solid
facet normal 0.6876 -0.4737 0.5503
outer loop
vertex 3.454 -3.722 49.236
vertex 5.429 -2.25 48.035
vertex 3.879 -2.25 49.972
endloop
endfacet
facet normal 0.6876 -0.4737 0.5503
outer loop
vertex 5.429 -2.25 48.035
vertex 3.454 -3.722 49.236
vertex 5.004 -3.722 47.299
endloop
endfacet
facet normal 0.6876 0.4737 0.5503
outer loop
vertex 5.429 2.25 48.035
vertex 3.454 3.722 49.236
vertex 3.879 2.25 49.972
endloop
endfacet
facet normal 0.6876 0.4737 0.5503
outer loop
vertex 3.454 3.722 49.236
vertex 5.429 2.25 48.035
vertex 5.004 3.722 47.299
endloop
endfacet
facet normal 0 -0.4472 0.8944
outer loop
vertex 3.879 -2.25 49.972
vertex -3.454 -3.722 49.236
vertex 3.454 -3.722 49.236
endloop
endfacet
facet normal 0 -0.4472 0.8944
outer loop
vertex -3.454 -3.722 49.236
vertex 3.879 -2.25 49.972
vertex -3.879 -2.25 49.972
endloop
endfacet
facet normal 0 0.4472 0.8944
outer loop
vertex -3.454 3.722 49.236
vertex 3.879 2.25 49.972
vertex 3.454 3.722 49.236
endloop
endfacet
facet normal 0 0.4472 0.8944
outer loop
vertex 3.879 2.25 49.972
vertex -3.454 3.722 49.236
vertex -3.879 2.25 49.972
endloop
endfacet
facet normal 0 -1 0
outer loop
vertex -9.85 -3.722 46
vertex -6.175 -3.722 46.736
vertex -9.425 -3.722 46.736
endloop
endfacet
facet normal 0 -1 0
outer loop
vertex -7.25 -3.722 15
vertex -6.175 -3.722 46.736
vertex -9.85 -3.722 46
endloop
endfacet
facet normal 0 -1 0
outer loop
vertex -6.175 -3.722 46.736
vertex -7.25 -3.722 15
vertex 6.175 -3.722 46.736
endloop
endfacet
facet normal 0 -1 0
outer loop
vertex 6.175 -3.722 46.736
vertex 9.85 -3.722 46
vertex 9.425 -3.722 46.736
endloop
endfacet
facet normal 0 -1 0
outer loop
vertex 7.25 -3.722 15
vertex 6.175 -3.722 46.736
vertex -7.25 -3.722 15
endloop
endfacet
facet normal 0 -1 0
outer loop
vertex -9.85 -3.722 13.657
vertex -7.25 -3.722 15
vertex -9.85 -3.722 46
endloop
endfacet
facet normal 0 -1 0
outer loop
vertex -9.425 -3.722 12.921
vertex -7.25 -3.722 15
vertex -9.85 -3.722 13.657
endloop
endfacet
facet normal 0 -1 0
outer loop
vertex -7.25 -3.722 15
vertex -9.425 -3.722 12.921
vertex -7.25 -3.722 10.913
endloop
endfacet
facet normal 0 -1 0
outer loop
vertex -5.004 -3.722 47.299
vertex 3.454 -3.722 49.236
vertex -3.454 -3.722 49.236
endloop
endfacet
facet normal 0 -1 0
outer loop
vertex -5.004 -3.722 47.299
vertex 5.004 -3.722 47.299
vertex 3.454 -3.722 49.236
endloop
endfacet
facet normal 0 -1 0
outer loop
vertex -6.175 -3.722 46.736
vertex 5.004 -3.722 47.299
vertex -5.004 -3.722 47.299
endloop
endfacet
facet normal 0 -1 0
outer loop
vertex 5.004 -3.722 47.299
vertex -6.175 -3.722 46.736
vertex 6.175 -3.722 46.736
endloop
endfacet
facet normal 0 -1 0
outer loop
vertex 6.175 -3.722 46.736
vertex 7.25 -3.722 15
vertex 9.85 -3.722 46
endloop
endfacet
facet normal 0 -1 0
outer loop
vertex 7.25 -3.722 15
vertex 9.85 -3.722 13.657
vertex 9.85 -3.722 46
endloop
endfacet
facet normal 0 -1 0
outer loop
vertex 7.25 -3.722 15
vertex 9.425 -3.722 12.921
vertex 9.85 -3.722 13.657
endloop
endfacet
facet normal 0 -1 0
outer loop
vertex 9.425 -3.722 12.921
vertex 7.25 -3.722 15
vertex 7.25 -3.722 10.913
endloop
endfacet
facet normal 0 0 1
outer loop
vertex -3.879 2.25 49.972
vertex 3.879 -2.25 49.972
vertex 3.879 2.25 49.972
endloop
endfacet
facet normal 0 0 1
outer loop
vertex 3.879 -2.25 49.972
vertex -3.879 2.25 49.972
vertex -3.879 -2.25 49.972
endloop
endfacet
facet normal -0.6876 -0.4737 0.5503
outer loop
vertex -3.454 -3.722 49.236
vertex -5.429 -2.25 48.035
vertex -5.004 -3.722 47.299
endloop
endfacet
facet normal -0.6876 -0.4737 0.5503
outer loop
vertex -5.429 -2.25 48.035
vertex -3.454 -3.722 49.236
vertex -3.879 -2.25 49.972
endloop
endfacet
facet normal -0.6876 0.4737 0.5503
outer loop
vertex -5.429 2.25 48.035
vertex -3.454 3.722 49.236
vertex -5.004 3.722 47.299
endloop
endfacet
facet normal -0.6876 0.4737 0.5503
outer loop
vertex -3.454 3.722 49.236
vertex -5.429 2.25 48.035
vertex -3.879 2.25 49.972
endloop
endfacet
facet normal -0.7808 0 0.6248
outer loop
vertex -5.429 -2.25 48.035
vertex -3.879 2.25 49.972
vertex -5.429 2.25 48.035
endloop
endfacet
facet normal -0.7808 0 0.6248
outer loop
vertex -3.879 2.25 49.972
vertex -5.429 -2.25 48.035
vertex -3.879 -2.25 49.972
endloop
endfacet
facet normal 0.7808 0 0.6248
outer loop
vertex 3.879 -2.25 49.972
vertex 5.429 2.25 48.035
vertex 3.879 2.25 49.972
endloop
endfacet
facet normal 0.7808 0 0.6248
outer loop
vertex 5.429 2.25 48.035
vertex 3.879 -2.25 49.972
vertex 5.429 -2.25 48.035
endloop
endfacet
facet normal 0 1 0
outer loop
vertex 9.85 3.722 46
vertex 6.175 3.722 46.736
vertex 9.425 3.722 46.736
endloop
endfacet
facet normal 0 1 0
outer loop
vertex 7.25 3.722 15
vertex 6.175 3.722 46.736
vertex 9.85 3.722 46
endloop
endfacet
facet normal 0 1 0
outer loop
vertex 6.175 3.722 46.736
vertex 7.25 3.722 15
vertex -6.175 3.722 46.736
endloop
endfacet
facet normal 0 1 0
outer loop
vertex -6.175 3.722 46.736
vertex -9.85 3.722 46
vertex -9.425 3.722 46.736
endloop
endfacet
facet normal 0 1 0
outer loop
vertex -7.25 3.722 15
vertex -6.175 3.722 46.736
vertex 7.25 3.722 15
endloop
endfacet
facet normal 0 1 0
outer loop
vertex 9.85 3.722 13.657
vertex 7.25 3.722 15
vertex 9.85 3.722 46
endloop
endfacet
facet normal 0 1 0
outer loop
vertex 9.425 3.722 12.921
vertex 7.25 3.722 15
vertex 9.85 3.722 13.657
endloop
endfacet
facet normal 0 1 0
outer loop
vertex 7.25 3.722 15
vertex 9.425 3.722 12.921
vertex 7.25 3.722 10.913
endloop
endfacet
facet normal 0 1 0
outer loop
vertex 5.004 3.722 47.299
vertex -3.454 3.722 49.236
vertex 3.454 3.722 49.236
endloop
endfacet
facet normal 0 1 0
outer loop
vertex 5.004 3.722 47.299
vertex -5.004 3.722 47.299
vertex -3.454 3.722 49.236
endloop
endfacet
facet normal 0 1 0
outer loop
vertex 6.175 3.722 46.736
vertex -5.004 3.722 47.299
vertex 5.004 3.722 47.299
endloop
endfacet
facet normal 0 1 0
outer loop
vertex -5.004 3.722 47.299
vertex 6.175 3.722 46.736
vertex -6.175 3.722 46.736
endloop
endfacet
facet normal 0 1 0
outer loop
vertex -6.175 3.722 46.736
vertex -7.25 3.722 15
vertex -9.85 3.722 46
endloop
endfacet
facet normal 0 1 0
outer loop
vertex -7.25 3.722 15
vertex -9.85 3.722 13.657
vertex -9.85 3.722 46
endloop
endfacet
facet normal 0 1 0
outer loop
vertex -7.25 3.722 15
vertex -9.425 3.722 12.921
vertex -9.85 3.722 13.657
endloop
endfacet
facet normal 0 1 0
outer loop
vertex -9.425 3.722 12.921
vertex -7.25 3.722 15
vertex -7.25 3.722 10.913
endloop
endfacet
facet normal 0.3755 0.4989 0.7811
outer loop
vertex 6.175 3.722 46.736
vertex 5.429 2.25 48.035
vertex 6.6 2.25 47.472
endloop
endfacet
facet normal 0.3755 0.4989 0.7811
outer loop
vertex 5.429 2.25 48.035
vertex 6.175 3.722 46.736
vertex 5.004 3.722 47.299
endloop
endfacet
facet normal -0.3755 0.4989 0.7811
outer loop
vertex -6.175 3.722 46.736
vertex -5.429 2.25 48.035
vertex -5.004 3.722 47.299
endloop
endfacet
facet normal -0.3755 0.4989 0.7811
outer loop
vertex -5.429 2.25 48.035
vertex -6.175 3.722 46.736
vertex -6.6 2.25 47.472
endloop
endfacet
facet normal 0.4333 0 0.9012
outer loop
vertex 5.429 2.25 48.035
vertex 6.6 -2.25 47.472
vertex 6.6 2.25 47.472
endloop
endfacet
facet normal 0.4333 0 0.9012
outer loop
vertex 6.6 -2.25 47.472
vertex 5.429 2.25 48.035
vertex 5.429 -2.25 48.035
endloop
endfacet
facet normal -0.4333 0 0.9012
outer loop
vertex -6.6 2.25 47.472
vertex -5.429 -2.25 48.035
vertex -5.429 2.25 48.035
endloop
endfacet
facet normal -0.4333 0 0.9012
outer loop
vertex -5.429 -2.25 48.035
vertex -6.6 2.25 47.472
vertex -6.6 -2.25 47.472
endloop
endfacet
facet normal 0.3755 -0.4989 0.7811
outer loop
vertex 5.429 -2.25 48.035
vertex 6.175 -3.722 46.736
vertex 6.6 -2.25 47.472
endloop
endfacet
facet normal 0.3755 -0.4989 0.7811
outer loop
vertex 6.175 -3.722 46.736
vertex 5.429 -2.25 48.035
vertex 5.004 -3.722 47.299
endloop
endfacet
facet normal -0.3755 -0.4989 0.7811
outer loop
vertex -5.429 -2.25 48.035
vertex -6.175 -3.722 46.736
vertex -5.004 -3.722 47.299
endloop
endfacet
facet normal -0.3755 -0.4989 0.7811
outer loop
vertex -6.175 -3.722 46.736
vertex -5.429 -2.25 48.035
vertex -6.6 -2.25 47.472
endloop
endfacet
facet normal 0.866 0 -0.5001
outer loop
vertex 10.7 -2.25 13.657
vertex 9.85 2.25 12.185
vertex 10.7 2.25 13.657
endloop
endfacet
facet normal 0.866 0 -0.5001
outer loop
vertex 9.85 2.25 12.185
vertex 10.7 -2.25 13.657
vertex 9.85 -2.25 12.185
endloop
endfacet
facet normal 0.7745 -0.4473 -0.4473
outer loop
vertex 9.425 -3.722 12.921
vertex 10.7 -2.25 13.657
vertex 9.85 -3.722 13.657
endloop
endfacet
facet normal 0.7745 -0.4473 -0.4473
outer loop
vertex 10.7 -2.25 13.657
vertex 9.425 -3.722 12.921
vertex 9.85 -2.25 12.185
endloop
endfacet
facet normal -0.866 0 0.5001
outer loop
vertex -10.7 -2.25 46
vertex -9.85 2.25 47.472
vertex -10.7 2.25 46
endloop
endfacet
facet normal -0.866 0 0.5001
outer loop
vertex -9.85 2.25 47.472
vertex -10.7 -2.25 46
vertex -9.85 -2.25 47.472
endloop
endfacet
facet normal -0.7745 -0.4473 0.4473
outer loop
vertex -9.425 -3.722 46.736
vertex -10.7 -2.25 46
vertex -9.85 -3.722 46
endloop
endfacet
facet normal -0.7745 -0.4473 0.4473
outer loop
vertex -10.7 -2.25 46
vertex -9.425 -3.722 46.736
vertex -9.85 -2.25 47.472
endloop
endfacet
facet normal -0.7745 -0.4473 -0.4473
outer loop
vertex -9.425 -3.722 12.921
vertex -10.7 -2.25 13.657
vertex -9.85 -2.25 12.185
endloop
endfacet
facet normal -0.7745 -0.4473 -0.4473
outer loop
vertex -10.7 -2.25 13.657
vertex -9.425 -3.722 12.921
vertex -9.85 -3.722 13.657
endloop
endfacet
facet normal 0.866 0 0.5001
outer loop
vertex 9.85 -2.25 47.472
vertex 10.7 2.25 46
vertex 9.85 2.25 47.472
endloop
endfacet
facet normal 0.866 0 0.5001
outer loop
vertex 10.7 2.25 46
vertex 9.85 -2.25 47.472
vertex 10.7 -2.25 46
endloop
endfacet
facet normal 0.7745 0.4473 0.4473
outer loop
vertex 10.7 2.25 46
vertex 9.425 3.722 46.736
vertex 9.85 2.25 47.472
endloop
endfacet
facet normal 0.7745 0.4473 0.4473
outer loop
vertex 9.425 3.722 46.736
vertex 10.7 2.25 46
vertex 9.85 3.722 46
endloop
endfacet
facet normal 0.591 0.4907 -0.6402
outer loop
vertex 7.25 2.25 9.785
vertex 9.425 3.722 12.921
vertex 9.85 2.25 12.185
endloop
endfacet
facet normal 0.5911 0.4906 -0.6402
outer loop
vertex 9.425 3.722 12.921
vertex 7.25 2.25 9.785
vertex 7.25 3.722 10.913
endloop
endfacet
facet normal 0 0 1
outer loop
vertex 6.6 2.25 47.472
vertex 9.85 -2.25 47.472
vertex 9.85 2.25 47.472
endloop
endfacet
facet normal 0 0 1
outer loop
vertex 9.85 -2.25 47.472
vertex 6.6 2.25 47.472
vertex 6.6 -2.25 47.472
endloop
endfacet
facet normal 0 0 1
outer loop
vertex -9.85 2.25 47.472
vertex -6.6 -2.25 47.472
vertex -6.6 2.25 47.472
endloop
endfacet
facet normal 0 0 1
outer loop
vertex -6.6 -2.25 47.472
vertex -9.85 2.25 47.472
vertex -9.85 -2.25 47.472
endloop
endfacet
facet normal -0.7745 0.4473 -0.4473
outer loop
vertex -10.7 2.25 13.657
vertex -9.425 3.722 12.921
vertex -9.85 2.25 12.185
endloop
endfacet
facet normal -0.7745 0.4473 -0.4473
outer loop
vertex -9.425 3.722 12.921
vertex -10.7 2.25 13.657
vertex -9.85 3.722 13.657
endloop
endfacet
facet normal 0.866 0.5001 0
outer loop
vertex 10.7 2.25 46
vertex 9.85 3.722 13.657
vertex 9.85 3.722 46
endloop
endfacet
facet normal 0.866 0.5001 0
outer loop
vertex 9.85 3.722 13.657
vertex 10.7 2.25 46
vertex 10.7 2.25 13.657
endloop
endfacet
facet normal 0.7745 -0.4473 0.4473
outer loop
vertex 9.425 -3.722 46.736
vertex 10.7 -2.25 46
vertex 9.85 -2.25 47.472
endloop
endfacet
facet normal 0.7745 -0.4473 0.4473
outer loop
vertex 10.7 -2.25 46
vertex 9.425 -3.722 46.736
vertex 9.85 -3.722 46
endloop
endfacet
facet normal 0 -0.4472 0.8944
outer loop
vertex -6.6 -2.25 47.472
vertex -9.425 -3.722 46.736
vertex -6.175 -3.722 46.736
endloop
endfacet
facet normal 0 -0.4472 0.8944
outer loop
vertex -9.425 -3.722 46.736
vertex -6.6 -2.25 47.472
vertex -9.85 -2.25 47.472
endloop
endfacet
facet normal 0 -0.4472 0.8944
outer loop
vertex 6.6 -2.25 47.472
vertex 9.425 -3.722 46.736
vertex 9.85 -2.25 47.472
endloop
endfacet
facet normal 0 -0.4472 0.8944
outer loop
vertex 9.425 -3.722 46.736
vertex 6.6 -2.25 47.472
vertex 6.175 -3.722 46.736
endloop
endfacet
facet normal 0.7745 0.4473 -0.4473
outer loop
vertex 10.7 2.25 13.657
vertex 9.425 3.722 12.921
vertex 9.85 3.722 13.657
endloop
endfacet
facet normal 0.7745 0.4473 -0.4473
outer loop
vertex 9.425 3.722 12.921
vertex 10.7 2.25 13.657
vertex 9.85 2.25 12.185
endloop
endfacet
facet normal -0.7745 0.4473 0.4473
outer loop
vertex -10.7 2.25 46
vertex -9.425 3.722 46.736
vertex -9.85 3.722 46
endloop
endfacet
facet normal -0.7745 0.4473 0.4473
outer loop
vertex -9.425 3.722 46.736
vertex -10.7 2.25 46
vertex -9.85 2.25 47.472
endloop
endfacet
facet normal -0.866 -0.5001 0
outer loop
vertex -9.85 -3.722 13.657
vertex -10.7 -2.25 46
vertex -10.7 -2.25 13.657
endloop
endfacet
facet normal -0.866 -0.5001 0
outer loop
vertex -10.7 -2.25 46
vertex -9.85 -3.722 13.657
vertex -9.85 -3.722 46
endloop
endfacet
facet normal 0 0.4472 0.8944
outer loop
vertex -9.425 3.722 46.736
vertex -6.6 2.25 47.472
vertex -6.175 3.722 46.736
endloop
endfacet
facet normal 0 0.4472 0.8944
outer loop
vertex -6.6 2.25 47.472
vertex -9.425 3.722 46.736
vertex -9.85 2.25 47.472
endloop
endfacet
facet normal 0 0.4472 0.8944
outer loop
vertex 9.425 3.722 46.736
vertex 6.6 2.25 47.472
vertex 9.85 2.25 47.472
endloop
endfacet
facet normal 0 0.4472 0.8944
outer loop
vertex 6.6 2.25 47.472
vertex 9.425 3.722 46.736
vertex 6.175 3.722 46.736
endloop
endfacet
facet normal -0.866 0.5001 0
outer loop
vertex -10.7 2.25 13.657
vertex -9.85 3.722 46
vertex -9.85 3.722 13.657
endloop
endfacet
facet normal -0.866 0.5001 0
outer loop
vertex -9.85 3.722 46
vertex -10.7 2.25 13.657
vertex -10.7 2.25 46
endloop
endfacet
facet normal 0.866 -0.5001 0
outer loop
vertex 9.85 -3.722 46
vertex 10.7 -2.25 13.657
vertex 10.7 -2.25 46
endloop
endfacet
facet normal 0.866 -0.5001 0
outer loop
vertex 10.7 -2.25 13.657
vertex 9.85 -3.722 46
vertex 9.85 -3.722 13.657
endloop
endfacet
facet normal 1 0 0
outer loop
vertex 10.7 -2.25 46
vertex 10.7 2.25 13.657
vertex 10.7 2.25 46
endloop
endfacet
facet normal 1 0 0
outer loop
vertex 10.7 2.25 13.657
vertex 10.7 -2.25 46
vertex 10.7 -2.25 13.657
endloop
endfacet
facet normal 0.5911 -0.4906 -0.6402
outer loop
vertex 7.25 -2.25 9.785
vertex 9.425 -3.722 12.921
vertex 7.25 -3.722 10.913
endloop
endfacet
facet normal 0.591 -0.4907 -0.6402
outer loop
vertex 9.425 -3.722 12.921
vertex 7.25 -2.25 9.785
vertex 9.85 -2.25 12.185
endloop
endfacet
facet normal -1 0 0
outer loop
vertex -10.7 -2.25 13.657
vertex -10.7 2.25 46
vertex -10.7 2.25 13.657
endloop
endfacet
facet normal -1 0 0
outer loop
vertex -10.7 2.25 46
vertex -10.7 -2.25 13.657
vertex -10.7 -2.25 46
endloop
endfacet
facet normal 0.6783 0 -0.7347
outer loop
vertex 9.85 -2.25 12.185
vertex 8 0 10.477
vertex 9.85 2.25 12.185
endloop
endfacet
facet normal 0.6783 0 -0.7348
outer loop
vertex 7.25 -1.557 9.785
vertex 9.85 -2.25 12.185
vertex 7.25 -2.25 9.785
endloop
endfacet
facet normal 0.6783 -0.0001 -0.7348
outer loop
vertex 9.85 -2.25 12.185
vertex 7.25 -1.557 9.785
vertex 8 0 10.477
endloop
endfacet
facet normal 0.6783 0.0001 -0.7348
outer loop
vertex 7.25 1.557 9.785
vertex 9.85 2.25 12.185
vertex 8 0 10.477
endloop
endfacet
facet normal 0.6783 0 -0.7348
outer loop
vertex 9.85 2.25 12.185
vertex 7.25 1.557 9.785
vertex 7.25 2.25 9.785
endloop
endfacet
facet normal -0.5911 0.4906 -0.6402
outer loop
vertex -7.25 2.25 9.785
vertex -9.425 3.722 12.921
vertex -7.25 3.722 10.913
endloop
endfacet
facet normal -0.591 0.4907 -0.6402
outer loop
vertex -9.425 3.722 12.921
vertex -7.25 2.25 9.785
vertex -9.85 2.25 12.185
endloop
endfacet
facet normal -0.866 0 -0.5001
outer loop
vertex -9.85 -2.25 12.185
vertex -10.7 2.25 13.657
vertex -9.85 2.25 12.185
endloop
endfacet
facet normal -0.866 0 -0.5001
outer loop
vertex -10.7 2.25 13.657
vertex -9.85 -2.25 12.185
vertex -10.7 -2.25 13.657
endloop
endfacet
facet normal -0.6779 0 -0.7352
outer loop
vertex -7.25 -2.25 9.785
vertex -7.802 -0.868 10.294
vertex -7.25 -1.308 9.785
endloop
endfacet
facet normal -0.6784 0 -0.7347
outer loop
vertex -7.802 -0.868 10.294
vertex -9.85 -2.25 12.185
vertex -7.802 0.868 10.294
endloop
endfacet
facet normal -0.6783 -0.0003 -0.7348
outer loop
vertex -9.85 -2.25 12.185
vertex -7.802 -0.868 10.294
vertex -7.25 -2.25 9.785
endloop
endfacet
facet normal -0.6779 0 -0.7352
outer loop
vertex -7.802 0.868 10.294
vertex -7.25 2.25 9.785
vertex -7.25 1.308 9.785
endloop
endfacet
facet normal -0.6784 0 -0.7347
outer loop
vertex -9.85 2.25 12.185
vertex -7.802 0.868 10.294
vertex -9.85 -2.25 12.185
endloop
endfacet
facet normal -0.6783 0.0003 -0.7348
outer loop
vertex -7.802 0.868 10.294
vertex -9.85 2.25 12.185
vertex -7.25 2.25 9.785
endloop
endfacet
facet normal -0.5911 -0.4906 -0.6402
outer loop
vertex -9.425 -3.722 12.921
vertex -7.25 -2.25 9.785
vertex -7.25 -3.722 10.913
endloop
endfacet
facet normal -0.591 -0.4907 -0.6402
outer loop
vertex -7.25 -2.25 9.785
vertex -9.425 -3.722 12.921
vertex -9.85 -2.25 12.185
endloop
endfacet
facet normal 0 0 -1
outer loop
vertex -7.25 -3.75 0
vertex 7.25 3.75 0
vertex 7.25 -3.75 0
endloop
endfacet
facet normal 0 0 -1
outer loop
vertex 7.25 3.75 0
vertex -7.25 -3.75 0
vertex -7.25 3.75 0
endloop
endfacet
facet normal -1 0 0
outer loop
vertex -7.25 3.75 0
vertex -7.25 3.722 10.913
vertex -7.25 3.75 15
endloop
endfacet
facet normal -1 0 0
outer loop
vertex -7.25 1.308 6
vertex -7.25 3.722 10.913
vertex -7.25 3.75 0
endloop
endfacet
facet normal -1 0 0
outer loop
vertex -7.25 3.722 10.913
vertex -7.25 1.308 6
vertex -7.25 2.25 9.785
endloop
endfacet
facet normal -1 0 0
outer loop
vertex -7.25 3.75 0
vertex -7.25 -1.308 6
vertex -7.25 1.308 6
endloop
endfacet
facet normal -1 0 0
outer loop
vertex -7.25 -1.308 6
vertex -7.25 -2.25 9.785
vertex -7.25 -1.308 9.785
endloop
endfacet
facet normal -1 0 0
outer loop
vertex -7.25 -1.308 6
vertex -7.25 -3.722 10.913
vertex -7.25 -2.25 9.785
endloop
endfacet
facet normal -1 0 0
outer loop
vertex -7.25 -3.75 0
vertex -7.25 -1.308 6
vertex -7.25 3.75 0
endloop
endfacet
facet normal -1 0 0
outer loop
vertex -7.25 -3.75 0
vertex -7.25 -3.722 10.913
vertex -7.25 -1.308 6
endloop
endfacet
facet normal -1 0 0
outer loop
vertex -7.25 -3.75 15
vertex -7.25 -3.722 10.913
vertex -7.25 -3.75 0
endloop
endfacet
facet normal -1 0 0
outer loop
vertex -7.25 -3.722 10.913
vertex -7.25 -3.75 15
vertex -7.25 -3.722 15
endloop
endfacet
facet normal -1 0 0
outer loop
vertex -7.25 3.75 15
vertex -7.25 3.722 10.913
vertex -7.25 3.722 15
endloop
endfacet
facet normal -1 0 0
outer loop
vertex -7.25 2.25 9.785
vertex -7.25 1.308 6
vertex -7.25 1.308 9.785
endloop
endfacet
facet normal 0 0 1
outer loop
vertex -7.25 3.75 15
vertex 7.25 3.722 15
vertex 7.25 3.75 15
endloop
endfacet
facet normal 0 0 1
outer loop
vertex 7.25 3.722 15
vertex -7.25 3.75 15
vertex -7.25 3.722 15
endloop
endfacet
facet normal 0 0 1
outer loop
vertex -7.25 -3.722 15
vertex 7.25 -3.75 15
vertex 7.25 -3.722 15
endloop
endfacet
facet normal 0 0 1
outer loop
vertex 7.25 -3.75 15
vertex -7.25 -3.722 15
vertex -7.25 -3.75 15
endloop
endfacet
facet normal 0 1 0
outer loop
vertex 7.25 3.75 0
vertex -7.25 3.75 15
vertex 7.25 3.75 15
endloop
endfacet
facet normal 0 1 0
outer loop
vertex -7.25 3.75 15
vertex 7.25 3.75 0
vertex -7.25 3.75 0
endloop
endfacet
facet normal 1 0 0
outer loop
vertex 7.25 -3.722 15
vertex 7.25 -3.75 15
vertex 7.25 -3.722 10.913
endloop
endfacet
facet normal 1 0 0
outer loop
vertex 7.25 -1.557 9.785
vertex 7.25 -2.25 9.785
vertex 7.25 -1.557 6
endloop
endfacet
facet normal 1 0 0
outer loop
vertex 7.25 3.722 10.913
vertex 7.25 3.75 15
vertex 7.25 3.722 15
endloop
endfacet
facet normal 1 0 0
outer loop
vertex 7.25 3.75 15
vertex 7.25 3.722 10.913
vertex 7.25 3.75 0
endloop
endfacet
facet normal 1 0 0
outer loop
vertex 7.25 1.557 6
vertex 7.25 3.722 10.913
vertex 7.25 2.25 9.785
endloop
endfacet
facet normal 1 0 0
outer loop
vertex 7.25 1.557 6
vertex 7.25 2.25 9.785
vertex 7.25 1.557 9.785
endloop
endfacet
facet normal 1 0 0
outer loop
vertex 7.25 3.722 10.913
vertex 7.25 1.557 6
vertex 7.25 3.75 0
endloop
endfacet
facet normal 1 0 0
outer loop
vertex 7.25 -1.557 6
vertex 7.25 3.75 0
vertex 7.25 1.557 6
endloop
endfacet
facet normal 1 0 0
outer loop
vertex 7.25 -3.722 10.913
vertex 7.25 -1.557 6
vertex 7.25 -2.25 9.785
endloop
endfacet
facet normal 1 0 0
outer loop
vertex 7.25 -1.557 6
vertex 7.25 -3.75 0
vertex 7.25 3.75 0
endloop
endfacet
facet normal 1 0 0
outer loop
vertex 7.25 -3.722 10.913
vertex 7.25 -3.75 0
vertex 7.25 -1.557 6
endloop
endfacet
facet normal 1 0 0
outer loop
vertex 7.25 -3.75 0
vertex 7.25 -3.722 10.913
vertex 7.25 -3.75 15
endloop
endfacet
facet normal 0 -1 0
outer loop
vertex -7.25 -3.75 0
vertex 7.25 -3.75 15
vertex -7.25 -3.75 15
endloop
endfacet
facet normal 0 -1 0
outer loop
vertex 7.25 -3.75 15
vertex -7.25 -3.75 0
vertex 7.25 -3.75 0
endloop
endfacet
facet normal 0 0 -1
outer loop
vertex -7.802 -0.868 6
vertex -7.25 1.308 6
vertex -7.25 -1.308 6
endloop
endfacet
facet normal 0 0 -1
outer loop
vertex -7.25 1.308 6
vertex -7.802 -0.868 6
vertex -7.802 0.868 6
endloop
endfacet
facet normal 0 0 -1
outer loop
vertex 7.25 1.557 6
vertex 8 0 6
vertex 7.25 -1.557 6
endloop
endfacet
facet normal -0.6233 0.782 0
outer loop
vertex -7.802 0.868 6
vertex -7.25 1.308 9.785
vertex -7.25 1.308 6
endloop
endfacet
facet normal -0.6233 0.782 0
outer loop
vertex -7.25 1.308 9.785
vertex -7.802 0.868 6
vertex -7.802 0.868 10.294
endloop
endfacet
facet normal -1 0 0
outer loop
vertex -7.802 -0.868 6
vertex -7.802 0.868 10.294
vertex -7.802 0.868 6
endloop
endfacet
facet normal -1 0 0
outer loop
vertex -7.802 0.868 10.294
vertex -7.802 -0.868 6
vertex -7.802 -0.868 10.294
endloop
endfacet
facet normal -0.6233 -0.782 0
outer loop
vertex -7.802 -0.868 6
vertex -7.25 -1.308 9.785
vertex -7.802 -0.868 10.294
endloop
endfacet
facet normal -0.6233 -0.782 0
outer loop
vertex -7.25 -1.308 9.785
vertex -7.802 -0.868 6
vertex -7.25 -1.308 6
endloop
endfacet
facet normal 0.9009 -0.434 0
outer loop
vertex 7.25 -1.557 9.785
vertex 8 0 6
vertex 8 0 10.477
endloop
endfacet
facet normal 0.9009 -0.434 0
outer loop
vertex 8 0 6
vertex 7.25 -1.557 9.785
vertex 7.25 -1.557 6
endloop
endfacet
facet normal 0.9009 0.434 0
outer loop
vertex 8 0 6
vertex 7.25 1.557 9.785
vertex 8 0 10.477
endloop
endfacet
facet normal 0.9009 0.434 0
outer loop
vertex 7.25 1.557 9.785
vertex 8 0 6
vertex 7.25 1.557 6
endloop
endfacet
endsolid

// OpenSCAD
// a sketch of the 20m USB extender from jaycar.
// USB hub with line-driver on a USB socket, in an over-moulding




overmould_dims=[25.6,12.6, 53.6];
overmould_width=overmould_dims[0];
overmould_height=overmould_dims[1];
overmould_length=overmould_dims[2];
overmould_face_width = 22.5;
overmould_face_ramp_len=11;




internal_mould_outline=[
  [ 0, 10-14.5/2],
  [ 14.5/2, 10],
  [ 21/2, 13],
  [ 21/2, 47.5],
  [ 11.5/2, 47.5],
  [ 7.5/2, 50],
  [-7.5/2, 50],
  [-11.5/2, 47.5],
  [-21/2, 47.5],
  [-21/2, 13],
  [-14.5/2, 10],
];
internal_mould_section = [21,7.5];

internal_mould_thickness = internal_mould_section[1];

usb_slot_main_dims=[14.5,7.5];



usb_a_overmould_main_dims=[15.8,7.8];
usb_a_overmould_r=1.5;




module usb_a_overmould_outline(){
  offset(usb_a_overmould_r+0.1)offset(-usb_a_overmould_r)
    square(usb_a_overmould_main_dims, center=true);
}



function usb_repeater_cable_dia() = 4.5;

ellipse_dims=[12,24, 1];
ellipse_centre=[0,0,0];

slot_width=0.8;
slot_depth=0.8;
num_slots=8;
slotting_length=15;
slot_pitch=(slotting_length-slot_width)/num_slots;

overmould_rear=[
  [overmould_face_width/2, 0],
  [overmould_width/2, overmould_face_ramp_len],
  [overmould_width/2, overmould_length],
  [-overmould_width/2, overmould_length],
  [-overmould_width/2, overmould_face_ramp_len],
  [-overmould_face_width/2, 0],
];
overmould_front=[
  [overmould_face_width/2, 0],
  [overmould_width/2, overmould_face_ramp_len],
  [-overmould_width/2, overmould_face_ramp_len],
  [-overmould_face_width/2, 0],
];



rounding_rad_x=1;
rounding_rad_rear=5;
rounding_rad_front=2;
rounding_rad_z=2.5;

/*
offset(r=rounding_rad_rear)
  offset(-rounding_rad_rear)
    polygon(overmould_rear);

offset(r=rounding_rad_front)
  offset(-rounding_rad_front)
    polygon(overmould_front);
*/
module terminal_hub_internal_section(wall=0.2){
  offset(r=1.5+wall)
    offset(r=-1.5)
      square(internal_mould_section, center=true);
}
module terminal_hub_internal(wall=0.2){

  // 2d drawing of the internal overmould
  rotate([90,0,0])
    minkowski(){
      sphere(r=1.5+wall);
      linear_extrude(internal_mould_thickness-3,center=true)
        offset(r=-1.5)
          polygon(internal_mould_outline);
    }

  // usb port
  linear_extrude(15)
    square(usb_slot_main_dims, center=true);
  //greebles in the USB port
  translate([0,0,6])
    linear_extrude(15-6)
      for(x=[-1,1])
        translate([x*((16/2)-2), 0])
          circle(r=2);

}





terminal_hub_internal();
